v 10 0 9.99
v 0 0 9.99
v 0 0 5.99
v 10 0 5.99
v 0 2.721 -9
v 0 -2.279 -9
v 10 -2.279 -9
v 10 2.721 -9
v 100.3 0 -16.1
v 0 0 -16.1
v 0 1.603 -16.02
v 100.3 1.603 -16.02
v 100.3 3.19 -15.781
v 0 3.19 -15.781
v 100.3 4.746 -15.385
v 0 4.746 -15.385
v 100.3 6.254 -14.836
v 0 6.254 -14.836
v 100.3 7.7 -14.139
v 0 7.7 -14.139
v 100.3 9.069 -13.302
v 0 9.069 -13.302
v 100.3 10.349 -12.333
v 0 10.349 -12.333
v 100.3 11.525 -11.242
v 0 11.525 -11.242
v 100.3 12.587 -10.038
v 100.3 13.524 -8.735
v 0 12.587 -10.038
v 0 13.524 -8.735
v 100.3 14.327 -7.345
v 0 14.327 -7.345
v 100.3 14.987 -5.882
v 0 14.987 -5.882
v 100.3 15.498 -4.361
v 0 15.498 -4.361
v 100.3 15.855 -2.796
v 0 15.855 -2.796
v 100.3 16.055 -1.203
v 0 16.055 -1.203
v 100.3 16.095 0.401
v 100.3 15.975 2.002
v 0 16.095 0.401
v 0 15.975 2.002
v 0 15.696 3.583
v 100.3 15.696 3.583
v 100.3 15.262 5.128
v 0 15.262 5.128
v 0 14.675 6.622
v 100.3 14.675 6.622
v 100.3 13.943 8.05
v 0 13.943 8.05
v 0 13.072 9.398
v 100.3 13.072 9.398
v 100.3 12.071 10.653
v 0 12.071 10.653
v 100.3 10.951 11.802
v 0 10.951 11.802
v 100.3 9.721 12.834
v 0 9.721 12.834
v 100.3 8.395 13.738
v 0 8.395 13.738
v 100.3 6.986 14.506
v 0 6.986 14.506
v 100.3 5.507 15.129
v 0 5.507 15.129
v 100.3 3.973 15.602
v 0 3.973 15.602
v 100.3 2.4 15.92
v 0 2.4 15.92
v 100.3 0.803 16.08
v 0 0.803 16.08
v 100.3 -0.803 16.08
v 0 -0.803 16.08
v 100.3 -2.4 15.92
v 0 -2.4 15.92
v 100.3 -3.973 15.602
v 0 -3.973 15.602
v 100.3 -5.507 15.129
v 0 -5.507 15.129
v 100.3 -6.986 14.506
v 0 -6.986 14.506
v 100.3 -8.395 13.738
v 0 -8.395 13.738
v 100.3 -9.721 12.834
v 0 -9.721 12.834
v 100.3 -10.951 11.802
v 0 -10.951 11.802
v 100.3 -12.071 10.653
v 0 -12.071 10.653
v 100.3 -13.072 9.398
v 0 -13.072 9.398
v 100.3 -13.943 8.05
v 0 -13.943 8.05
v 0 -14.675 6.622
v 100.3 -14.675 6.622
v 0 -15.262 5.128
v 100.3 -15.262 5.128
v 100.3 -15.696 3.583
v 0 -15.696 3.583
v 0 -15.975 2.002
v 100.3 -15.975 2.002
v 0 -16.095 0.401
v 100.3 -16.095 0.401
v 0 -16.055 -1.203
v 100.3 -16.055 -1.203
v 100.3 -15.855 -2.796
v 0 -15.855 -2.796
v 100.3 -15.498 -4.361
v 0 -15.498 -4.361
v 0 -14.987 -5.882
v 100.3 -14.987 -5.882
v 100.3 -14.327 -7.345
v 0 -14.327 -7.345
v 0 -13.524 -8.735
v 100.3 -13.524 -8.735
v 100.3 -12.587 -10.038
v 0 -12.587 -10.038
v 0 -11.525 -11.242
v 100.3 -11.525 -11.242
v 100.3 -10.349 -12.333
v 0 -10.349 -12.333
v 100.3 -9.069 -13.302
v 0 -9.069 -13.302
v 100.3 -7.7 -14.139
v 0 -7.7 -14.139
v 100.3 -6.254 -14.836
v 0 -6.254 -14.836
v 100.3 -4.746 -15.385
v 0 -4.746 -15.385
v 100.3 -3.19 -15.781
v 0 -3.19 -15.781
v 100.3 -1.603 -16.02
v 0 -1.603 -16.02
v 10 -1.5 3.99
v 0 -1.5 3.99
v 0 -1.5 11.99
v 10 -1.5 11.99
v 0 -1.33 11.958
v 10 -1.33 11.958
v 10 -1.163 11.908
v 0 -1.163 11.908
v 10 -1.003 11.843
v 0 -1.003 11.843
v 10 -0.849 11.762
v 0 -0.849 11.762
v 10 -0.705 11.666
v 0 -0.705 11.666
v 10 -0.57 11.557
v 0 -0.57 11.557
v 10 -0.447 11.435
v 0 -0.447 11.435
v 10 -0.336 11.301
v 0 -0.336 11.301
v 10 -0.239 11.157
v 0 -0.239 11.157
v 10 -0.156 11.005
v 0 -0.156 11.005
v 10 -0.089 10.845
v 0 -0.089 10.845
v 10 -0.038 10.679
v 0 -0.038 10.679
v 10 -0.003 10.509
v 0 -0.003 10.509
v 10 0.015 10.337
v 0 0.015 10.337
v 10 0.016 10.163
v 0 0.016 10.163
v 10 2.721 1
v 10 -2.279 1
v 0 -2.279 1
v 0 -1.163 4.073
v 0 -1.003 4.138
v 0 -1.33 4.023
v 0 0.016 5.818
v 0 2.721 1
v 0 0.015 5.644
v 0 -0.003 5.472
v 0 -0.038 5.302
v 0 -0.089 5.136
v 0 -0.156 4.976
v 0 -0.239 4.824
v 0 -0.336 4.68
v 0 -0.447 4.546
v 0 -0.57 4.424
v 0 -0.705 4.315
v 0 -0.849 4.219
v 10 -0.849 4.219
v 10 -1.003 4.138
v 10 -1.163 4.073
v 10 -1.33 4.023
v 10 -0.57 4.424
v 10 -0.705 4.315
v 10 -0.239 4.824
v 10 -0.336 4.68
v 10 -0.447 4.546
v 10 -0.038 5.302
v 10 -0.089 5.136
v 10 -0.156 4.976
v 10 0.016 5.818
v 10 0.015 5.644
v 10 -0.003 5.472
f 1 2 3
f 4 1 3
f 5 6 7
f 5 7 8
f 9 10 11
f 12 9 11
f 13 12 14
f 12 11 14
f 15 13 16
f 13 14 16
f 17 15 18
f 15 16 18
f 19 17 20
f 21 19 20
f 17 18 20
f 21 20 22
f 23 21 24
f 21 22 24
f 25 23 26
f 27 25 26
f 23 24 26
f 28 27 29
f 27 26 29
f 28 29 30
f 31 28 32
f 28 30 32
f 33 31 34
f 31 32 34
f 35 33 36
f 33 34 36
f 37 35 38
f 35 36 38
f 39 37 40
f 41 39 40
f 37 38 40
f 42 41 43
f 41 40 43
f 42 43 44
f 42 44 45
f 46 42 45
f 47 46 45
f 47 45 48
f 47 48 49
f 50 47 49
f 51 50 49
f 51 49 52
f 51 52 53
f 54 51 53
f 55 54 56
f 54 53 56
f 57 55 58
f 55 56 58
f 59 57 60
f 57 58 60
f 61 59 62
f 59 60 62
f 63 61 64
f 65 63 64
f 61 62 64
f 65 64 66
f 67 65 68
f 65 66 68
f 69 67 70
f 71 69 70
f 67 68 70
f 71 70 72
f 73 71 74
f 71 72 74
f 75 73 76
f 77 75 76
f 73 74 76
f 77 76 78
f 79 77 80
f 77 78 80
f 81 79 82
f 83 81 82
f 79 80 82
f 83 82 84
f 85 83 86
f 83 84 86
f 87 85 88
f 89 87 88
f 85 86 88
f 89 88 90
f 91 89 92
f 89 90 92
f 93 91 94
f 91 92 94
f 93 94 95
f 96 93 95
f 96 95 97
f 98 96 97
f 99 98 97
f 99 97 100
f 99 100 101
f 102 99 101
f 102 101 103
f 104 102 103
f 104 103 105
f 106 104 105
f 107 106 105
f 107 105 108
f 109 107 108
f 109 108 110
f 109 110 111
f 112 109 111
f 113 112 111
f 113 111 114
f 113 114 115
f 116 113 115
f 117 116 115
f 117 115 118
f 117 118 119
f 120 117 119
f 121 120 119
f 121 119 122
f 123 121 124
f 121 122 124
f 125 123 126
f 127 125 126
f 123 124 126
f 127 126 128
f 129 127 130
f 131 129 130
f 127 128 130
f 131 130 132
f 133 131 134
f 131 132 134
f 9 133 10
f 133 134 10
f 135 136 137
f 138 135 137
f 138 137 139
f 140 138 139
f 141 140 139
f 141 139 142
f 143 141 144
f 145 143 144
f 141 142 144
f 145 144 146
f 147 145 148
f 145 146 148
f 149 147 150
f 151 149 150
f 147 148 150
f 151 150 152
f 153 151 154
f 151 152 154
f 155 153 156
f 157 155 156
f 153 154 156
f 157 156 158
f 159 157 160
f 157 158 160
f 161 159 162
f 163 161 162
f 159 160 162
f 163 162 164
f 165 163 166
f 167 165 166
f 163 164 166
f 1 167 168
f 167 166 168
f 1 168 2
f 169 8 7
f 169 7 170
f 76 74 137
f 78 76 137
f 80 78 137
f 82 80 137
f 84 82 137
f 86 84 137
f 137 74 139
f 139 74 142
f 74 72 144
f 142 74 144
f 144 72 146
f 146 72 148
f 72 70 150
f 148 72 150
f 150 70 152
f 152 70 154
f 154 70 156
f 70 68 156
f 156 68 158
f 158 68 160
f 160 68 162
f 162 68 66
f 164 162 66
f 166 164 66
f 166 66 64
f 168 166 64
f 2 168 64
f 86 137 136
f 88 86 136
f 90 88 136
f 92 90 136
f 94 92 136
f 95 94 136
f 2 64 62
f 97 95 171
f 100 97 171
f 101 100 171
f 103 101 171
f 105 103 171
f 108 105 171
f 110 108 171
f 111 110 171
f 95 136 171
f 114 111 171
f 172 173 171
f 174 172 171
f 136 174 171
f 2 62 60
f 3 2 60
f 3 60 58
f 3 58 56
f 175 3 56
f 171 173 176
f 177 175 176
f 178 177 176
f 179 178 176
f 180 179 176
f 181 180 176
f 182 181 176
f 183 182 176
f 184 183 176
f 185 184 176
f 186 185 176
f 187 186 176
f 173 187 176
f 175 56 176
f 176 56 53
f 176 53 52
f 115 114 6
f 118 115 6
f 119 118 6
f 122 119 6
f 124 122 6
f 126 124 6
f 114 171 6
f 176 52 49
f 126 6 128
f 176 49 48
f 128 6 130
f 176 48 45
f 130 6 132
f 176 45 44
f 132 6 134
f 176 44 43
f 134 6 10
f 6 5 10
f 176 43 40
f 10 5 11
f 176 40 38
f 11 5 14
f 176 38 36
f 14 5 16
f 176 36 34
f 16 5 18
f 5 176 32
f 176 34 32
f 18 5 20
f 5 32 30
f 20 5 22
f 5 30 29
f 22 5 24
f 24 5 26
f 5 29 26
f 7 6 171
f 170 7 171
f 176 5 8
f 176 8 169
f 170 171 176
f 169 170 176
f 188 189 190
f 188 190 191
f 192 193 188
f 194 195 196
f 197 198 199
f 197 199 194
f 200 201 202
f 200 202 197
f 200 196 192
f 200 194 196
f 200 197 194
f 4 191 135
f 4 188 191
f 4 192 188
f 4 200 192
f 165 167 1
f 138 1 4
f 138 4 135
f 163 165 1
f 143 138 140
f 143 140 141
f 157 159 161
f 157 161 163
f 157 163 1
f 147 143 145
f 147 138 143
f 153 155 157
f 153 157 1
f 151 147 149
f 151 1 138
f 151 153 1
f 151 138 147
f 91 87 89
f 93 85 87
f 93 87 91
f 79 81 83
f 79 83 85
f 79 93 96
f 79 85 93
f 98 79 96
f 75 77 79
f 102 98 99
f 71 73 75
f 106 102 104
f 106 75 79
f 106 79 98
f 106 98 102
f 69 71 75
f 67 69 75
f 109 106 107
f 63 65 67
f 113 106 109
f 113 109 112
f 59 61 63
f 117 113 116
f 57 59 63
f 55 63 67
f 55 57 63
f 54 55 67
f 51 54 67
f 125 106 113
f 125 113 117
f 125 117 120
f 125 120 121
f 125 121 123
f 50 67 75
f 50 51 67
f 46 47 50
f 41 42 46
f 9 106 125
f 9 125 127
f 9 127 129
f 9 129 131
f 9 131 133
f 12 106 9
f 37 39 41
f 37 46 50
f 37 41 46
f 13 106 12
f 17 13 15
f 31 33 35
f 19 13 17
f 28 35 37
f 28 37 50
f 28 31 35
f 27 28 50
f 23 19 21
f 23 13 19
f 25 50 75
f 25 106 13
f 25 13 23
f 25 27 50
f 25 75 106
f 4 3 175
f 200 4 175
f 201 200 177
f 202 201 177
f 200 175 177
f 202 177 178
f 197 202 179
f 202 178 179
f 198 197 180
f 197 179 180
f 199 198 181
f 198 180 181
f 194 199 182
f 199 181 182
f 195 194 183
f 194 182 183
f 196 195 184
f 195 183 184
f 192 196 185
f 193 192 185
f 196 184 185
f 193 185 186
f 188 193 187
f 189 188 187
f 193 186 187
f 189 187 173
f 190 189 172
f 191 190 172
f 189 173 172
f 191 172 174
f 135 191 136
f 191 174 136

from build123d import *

# Parameters (mm, degrees)
ESQUISSE1_R             = 16.1
BOSS_EXTRU_1_DEPTH      = 100.3
ESQUISSE2_W             = 10
ESQUISSE2_H             = 5
ENL_V_MAT_EXTRU_1_DEPTH = 10
ENL_V_MAT_EXTRU_2_DEPTH = 10


with BuildPart() as part:
    # Esquisse1 → Boss.-Extru.1 (new body)
    with BuildSketch(Plane(origin=(0, 0, 0), x_dir=(0, 0, -1), z_dir=(1, 0, 0))):
        Circle(ESQUISSE1_R)
    extrude(amount=BOSS_EXTRU_1_DEPTH)

    # Esquisse2 → Enlèv. mat.-Extru.1 (cut)
    with BuildSketch(Plane.ZY):
        with Locations((-4, 0.220705936)):
            Rectangle(ESQUISSE2_W, ESQUISSE2_H)
    extrude(amount=-ENL_V_MAT_EXTRU_1_DEPTH, mode=Mode.SUBTRACT)

    # Esquisse3 → Enlèv. mat.-Extru.2 (cut)
    with BuildSketch(Plane.ZY):
        with BuildLine():
            Line((3.990495341, -1.5), (11.990495341, -1.5))
            ThreePointArc((11.990495341, -1.5), (11.301155513, -0.335786438), (9.990495341, 0))
            Line((9.990495341, 0), (5.990495341, 0))
            ThreePointArc((5.990495341, 0), (4.679835169, -0.335786438), (3.990495341, -1.5))
        make_face()
    extrude(amount=-ENL_V_MAT_EXTRU_2_DEPTH, mode=Mode.SUBTRACT)


solid = part.part
